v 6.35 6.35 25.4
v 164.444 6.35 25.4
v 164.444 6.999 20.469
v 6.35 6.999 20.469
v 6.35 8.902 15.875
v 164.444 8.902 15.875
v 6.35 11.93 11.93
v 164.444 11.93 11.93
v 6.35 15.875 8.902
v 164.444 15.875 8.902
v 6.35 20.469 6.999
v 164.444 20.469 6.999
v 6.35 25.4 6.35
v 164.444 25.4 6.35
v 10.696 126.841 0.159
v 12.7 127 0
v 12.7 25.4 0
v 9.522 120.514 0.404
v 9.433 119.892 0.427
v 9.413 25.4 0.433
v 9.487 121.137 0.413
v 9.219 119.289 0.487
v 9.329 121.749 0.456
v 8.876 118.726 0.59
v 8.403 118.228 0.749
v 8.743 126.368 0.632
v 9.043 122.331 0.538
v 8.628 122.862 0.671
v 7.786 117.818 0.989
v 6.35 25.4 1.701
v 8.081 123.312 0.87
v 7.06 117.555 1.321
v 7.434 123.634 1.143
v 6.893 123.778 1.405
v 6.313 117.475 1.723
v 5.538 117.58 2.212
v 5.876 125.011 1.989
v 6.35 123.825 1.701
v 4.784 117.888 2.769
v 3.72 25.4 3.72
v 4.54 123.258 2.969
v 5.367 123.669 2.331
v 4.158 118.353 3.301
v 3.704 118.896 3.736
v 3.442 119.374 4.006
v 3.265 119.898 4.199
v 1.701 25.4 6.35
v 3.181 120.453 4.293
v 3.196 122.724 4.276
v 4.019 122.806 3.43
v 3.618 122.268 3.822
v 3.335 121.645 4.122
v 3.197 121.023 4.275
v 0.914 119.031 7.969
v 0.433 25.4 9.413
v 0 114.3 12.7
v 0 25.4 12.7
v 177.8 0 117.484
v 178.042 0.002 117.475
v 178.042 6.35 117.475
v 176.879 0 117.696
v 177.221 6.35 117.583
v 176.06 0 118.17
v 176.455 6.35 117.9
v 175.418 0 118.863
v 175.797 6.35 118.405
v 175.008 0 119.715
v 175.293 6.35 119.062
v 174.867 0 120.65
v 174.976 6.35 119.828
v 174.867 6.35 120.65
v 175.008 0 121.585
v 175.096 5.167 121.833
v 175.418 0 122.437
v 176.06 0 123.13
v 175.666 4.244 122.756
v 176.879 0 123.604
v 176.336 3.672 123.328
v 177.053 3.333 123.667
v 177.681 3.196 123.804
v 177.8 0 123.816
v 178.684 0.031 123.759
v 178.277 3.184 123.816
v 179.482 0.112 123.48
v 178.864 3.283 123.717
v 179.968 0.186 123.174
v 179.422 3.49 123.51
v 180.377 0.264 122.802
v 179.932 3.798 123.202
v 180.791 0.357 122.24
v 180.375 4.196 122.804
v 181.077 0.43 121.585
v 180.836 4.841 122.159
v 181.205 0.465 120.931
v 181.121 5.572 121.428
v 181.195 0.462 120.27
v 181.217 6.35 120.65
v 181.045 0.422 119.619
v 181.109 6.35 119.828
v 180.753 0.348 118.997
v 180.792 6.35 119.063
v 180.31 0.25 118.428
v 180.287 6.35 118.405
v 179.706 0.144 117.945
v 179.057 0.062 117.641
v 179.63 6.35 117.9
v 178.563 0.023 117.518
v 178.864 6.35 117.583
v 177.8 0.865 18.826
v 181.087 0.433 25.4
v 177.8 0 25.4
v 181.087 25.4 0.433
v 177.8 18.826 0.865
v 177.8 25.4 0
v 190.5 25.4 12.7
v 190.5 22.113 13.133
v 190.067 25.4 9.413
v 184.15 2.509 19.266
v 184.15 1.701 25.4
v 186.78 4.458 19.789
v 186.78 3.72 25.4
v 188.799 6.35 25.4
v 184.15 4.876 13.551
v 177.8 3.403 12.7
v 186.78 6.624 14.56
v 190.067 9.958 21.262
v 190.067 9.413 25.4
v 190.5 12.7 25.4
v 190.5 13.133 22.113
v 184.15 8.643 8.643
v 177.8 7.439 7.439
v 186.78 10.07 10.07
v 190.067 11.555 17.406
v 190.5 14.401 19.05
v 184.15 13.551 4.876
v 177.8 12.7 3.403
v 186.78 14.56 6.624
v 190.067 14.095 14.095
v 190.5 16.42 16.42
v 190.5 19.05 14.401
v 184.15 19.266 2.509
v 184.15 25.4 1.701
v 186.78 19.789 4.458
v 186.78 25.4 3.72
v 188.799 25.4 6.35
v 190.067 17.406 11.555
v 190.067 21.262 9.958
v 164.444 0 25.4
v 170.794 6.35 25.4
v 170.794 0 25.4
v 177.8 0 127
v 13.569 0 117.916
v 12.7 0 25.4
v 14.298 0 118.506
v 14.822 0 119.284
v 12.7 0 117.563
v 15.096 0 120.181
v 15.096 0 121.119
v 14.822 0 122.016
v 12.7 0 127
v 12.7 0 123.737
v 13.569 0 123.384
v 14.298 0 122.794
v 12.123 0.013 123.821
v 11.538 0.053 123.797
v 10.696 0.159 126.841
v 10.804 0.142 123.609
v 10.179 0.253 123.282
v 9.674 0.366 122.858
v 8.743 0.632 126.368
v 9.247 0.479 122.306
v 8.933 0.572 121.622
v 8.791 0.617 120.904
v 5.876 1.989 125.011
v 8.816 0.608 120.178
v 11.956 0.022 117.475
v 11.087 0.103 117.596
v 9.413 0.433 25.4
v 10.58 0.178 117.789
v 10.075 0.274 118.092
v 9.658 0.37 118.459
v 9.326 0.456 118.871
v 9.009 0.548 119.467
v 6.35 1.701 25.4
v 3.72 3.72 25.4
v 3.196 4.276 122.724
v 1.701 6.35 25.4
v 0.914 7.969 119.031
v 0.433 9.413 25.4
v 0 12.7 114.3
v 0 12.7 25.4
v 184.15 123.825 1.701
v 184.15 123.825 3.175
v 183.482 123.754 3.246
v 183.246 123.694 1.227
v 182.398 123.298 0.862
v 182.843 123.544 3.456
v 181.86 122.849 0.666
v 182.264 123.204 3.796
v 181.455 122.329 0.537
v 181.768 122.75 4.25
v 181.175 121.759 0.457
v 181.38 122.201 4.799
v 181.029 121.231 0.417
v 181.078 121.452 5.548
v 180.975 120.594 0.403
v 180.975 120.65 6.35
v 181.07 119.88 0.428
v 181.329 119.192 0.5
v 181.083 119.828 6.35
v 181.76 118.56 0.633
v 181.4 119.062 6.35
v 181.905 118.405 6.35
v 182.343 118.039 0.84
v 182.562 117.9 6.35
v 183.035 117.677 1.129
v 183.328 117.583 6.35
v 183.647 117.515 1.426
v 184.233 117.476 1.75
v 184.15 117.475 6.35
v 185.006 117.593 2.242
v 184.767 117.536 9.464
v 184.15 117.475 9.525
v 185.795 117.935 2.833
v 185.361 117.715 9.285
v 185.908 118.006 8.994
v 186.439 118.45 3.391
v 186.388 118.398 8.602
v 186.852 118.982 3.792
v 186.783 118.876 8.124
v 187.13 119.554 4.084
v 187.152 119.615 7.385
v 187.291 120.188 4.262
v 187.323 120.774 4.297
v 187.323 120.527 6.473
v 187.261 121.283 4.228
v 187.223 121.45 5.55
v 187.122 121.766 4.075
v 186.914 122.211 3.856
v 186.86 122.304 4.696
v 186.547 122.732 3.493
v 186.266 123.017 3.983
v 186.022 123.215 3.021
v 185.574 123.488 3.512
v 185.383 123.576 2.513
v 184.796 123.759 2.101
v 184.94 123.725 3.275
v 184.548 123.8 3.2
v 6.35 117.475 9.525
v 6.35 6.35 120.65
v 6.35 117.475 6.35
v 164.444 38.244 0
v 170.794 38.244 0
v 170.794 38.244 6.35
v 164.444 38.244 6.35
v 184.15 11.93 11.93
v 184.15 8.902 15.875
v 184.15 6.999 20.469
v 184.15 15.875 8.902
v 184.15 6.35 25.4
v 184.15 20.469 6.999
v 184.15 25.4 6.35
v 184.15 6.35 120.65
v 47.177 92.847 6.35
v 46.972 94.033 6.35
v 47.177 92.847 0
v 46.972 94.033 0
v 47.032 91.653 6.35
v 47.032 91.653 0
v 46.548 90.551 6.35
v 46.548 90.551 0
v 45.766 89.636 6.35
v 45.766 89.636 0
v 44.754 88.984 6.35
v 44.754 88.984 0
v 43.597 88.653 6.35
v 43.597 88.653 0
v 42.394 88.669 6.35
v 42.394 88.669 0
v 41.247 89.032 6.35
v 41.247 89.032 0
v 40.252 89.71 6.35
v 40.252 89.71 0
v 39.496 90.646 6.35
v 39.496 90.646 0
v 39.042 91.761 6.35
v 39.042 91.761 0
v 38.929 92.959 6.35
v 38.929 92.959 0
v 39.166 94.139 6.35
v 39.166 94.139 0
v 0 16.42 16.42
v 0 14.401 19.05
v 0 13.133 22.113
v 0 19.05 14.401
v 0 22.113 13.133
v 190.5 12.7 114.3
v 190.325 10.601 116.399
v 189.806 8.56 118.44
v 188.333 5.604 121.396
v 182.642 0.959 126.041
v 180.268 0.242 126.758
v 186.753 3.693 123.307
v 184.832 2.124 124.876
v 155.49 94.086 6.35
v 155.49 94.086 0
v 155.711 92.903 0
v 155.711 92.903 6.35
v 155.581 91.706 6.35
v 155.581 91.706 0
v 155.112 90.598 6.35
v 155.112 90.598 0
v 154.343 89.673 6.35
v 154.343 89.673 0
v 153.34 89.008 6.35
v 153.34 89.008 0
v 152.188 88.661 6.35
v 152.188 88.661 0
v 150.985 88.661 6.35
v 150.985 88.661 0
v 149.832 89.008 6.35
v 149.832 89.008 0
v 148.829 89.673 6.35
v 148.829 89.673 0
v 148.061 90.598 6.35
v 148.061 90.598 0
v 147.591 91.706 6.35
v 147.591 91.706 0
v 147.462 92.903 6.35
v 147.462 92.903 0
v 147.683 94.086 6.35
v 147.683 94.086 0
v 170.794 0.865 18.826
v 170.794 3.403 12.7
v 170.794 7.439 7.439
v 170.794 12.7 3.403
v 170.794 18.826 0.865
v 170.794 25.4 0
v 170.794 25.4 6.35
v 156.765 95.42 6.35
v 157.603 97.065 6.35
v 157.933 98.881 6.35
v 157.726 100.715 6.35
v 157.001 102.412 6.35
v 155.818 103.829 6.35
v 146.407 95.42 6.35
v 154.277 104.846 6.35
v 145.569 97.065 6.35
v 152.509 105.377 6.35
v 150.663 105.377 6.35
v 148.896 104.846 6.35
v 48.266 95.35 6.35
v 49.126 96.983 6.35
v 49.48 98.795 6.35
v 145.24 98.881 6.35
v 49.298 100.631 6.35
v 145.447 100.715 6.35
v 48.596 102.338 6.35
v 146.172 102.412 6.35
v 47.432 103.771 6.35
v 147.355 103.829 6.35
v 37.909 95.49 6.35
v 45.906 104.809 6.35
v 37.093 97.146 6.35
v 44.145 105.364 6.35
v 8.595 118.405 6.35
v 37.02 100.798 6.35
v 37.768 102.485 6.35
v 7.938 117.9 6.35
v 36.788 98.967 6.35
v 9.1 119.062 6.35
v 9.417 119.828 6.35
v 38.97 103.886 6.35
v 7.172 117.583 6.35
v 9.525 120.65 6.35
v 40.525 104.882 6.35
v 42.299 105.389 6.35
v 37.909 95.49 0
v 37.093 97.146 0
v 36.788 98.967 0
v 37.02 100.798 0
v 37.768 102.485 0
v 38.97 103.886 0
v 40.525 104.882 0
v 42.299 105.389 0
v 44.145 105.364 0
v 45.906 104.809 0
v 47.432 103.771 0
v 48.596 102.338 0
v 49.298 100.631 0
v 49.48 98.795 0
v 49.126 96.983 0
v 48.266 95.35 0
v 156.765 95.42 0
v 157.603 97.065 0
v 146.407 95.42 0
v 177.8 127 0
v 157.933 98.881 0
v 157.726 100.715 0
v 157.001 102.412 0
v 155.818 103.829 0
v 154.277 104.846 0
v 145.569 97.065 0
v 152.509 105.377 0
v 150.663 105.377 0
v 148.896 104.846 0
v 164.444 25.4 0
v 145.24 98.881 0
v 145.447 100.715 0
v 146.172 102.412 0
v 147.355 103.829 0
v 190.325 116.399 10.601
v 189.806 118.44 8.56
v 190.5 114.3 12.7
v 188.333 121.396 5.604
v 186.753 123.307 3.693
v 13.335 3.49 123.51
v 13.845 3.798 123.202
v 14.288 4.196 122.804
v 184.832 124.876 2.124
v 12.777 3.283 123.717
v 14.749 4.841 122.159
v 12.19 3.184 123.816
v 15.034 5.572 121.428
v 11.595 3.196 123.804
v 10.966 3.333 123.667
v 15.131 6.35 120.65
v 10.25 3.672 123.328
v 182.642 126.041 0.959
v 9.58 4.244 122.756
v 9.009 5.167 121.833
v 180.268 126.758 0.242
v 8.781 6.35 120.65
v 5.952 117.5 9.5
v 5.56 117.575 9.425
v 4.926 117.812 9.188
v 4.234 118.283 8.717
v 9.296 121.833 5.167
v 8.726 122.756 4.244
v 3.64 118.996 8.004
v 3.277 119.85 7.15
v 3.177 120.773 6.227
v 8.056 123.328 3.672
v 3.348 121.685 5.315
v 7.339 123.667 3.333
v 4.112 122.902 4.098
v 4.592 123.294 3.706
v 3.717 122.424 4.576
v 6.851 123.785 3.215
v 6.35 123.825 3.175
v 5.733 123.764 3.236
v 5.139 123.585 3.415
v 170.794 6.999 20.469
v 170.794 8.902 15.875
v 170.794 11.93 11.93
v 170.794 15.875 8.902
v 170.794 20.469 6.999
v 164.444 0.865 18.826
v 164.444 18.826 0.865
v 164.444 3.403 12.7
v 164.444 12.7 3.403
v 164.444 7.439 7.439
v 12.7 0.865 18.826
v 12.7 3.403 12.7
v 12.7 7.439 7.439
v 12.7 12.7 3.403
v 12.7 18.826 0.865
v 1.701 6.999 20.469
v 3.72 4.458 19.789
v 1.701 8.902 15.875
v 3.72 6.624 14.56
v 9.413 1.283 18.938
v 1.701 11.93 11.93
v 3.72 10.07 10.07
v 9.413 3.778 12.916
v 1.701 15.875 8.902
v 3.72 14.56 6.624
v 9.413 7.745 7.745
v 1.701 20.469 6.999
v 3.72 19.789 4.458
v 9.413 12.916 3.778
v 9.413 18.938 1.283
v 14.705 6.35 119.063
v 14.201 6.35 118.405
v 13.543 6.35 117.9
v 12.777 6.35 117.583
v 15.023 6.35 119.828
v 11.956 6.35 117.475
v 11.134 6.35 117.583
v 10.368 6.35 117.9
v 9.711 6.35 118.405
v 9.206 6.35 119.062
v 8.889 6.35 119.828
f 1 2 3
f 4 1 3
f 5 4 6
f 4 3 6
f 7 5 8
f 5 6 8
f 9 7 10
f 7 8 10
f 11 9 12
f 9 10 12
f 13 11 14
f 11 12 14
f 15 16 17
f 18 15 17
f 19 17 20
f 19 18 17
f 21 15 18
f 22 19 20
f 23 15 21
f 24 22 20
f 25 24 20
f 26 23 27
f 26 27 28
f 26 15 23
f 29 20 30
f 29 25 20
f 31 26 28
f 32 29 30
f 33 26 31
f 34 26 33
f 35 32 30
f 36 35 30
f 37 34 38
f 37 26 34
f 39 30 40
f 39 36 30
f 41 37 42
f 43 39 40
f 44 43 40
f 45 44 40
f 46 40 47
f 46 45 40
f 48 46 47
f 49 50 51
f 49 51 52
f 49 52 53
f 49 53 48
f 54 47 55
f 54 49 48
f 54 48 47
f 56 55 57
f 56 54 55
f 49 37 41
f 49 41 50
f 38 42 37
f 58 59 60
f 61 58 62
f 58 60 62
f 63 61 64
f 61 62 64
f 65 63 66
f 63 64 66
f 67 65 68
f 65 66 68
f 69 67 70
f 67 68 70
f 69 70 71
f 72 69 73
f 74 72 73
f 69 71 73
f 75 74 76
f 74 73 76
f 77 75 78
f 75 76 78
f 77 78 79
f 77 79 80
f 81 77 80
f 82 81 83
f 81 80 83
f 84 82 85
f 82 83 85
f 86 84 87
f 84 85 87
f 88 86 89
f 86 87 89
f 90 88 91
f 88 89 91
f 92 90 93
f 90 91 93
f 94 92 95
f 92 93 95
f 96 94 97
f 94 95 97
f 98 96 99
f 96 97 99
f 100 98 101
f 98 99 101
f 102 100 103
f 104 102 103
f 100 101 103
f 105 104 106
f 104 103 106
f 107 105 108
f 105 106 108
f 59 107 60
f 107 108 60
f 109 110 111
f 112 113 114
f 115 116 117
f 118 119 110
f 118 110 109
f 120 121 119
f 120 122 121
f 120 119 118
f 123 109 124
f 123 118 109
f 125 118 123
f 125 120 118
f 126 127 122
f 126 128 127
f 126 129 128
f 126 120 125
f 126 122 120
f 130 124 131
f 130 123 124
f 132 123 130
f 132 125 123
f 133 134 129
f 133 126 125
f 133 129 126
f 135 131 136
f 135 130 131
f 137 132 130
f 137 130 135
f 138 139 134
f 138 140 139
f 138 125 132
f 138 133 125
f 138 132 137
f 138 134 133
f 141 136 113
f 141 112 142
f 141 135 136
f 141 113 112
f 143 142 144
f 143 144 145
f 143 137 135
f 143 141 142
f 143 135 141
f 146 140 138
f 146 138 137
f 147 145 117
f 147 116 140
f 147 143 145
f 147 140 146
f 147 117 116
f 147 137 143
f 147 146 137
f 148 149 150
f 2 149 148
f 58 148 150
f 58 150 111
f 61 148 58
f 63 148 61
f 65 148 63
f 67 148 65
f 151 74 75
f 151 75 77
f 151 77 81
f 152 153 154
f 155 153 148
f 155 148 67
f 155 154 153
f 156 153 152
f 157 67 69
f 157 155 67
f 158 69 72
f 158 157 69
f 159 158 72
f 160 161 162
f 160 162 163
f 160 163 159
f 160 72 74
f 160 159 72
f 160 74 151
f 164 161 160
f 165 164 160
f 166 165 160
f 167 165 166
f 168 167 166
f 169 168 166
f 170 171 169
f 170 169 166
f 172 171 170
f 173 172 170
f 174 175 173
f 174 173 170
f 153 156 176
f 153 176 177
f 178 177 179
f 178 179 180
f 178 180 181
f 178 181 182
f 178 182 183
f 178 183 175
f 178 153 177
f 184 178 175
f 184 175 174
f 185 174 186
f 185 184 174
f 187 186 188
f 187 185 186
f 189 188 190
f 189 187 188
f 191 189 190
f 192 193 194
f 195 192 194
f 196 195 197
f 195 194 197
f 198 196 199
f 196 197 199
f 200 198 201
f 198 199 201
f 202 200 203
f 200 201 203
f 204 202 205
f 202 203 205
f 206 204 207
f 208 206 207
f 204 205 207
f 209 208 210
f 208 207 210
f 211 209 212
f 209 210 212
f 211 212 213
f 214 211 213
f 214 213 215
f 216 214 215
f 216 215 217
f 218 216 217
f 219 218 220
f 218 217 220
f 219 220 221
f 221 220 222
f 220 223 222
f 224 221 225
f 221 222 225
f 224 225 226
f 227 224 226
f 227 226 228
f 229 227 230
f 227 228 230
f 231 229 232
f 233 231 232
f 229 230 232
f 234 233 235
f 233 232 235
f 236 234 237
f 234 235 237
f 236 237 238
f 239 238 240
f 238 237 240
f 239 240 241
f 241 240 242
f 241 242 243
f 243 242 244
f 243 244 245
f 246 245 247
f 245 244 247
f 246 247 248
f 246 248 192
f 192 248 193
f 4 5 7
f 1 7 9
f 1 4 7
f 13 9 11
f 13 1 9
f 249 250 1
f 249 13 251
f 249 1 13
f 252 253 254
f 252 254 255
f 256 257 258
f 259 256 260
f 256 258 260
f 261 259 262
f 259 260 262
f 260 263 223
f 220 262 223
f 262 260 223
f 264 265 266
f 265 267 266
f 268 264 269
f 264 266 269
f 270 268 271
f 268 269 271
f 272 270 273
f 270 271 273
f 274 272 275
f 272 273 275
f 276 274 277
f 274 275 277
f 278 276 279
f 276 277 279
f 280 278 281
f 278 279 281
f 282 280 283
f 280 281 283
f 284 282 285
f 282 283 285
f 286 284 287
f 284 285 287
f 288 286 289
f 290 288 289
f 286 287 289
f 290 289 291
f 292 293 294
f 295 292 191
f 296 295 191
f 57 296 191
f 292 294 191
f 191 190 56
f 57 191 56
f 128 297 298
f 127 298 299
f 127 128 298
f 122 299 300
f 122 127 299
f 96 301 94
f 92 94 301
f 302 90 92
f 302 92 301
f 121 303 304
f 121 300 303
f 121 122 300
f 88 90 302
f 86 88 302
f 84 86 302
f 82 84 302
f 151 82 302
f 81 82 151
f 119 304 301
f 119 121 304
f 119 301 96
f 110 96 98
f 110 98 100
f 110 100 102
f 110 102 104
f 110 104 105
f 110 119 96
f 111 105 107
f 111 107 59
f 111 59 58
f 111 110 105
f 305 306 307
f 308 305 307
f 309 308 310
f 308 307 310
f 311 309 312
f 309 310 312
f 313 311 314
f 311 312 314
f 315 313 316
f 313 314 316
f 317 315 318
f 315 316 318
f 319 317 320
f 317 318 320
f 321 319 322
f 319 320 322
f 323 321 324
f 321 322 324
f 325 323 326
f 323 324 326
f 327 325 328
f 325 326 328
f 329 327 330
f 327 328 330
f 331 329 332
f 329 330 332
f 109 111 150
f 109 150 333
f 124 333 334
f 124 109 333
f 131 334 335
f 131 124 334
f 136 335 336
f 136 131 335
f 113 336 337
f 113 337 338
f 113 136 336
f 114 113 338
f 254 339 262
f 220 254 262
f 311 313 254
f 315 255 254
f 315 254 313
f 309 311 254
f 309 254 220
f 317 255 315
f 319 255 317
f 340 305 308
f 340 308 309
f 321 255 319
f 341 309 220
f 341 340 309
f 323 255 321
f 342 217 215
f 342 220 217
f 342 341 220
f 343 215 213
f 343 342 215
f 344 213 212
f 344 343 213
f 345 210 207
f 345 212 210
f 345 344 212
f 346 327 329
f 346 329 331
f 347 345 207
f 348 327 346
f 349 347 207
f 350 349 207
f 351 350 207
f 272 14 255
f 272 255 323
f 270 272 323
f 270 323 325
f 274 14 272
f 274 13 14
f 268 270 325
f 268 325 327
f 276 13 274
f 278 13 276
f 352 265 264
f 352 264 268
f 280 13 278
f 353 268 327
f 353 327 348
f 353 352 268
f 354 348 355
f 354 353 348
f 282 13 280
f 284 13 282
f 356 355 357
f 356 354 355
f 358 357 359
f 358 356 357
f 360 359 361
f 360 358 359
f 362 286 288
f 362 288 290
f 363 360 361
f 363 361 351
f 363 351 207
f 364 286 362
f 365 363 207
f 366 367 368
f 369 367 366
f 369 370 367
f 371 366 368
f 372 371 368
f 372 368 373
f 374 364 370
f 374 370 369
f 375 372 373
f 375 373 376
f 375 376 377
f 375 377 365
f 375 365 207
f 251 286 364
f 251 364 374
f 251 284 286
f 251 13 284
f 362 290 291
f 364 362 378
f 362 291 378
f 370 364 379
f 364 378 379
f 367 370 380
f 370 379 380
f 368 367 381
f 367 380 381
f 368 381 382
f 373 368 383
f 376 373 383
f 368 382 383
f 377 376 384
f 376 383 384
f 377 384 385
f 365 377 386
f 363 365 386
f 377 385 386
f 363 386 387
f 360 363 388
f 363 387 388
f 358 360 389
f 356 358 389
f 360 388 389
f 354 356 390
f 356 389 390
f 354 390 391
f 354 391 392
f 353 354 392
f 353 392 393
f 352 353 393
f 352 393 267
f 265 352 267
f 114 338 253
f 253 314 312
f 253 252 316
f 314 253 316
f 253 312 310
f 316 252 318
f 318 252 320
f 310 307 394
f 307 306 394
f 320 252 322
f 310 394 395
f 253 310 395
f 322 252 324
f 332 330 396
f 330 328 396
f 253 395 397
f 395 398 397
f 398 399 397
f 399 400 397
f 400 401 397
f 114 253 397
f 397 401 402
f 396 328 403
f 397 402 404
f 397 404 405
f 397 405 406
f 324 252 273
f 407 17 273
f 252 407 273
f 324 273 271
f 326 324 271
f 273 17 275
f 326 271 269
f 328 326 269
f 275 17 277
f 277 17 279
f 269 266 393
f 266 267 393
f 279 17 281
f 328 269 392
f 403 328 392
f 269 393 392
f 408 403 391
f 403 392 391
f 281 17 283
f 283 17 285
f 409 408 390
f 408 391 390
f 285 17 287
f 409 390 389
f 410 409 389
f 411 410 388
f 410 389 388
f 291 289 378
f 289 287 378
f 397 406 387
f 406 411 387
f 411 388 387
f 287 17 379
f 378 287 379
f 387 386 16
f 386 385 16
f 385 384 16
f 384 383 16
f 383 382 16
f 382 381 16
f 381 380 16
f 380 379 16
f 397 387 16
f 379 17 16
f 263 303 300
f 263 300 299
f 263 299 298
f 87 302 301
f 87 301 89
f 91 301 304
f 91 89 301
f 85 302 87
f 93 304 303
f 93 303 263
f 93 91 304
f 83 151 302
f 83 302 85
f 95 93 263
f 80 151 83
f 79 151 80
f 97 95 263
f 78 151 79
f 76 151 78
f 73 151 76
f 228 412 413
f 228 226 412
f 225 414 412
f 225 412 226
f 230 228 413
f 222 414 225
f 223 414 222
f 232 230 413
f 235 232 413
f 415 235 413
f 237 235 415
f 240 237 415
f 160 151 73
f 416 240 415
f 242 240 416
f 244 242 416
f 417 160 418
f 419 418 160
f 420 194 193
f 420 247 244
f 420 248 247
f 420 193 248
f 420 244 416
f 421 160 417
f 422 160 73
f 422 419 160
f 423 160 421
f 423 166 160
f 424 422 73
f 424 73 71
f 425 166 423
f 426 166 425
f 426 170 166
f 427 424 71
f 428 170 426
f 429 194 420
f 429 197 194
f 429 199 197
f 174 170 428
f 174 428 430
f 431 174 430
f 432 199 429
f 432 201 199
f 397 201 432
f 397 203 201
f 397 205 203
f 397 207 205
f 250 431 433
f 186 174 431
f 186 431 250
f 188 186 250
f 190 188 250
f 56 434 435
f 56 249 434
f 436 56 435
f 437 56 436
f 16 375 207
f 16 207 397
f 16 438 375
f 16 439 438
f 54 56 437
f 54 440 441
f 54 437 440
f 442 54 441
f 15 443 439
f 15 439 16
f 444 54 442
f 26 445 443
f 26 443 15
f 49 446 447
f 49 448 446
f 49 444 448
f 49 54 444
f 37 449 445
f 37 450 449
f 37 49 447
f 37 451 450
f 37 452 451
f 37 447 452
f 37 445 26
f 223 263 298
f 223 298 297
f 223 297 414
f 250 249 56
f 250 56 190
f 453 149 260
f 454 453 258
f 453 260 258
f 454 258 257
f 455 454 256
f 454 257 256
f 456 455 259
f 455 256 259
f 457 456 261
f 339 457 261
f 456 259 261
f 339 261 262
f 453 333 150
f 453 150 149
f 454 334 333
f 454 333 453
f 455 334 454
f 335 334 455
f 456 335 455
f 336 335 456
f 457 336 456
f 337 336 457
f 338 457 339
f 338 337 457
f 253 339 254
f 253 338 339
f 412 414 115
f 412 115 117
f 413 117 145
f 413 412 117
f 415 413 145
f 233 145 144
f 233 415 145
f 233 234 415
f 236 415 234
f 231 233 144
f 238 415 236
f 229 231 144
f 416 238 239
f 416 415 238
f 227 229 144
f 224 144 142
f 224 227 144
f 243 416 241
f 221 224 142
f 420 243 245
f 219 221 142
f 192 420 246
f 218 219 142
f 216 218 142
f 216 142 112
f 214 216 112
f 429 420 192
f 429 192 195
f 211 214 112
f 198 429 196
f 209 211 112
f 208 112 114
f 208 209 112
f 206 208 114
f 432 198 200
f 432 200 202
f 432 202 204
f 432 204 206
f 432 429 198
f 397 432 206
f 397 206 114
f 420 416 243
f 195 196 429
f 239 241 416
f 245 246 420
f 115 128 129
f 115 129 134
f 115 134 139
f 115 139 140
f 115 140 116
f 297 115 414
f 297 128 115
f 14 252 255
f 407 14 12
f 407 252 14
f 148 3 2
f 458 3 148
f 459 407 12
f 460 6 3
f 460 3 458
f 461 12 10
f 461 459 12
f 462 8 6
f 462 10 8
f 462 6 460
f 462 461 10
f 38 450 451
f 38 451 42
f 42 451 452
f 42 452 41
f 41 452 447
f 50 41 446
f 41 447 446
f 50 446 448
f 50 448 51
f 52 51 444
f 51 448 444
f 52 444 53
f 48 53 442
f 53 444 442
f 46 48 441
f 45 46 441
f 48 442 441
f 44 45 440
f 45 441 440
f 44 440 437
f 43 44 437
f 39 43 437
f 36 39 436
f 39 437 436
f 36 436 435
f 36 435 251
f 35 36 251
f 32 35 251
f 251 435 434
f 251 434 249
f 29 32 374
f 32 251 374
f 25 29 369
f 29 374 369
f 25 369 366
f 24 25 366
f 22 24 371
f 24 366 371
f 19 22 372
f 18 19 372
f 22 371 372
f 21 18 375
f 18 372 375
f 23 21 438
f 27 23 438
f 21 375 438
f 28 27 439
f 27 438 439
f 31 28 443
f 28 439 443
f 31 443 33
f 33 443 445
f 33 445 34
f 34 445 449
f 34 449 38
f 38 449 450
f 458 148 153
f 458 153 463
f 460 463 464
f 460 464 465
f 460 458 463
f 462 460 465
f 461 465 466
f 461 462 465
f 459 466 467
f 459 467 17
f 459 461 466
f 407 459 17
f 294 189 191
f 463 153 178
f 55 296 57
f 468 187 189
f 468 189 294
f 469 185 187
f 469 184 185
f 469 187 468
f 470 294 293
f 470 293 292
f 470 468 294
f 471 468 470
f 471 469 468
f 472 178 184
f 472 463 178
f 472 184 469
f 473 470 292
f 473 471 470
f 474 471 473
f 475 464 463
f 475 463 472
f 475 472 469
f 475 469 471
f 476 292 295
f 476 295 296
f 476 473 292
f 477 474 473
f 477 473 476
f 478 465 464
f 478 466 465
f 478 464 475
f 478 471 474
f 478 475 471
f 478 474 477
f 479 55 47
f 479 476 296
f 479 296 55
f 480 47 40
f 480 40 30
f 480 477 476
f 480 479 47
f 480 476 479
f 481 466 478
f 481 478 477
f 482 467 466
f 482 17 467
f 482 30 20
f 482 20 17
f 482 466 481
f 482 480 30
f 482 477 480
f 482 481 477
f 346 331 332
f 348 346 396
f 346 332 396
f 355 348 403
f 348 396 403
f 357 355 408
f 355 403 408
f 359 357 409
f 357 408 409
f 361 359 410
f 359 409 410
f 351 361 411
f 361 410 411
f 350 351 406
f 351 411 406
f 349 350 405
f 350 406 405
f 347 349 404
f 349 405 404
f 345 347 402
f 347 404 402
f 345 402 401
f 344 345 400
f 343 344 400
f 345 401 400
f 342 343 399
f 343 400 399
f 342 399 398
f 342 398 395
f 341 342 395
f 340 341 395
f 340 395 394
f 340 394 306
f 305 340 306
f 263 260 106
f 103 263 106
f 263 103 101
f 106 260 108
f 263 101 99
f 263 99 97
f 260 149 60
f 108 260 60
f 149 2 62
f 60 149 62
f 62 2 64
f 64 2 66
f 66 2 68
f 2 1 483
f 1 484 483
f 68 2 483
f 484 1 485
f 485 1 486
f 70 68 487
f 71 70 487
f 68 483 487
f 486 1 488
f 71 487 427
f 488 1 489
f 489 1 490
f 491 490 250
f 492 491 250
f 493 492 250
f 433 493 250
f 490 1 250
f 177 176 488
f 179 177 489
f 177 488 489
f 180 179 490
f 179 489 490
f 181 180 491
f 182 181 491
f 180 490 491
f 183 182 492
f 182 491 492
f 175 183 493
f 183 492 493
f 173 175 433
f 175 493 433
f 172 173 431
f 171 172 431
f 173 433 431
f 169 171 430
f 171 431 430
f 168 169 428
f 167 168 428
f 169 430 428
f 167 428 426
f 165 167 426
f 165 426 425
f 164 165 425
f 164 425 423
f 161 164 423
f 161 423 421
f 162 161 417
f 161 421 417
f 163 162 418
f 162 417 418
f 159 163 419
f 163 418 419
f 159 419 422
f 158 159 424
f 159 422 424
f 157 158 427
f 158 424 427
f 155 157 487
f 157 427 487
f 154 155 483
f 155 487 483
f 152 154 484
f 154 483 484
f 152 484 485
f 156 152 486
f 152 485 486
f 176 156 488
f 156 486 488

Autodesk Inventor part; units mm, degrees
ref_plane "YZ Plane" through (0, 0, 0) normal (1, 0, 0) x (0, 1, 0)
ref_plane "XZ Plane" through (0, 0, 0) normal (0, 1, 0) x (-1, 0, 0)
ref_plane "XY Plane" through (0, 0, 0) normal (0, 0, 1) x (1, 0, 0)
sketch "Sketch1" plane through (0, 0, 0) normal (1, 0, 0) x (0, 1, 0)
  line L0 (0, 0) -> (127, 0)
  line L1 (0, 0) -> (0, 127)
  line L2 (0, 127) -> (127, 0)
  dimension "d0" = 127
  dimension "d1" = 127
extrude "Extrusion1" add sketch "Sketch1" along normal blind 190.5
fillet "Fillet1" radius 25.4 1 edges at (95.25, 0, 0)
shell "Shell1" thickness 6.35 removed faces 1 at (127, 84.6667, 42.3333)
fillet "Fillet2" radius 12.7 6 edges at (190.5, 7.4395, 7.4395) (190.5, 0, 76.2) (190.5, 76.2, 0) (0, 7.4395, 7.4395) (0, 0, 76.2) (0, 76.2, 0)
sketch "Sketch2" plane through (177.8, 127, 0) normal (0, 0, -1) x (-1, 0, 0)
  line L0 (7.0063, -88.7561) -> (13.3563, -88.7561)
  line L1 (13.3563, -88.7561) -> (13.3563, -152.2561)
  line L2 (13.3563, -152.2561) -> (7.0063, -152.2561)
  line L3 (7.0063, -152.2561) -> (7.0063, -88.7561)
  point P0 (177.8, -127)
  dimension "d7" = 6.35
  dimension "d8" = 63.5
extrude "Extrusion2" cut sketch "Sketch2" against normal blind 25.4
sketch "Sketch3" plane through (177.8, 127, 0) normal (0, 0, -1) x (-1, 0, 0)
  circle A0 centre (26.2137, -27.9058) radius 6.35
  circle A1 centre (134.6629, -27.9058) radius 6.35
  point P0 (177.8, -127)
  dimension "d11" = 12.7
  dimension "d12" = 12.7
extrude "Extrusion3" cut sketch "Sketch3" against normal blind 25.4
sketch "Sketch4" plane through (177.8, 127, 0) normal (0, 0, -1) x (-1, 0, 0)
  circle A0 centre (26.2137, -27.9058) radius 6.35 projected
  circle A1 centre (26.2137, -34.2558) radius 4.1275
  circle A2 centre (134.749, -34.2558) radius 4.1275
  point P0 (177.8, -127)
  dimension "d15" = 8.255
  dimension "d16" = 8.255
extrude "Extrusion4" cut sketch "Sketch4" against normal blind 25.4 contours A1 A0 | A0 A1 | A2 picked at (25.4127, -32.8707) picked at (27.1236, -35.5058)
sketch "Sketch5" plane through (177.8, 127, 0) normal (0, 0, -1) x (-1, 0, 0)
  point P0 (177.8, -127)
  point P1 (-6.35, -6.35)
  point P2 (171.45, -6.35)
  point P3 (171.45, -6.35)
hole "Hole1" at (184.15, 120.65, 0) at (6.35, 120.65, 0) direction (0, 0, 1) diameter 6.35 end through all
sketch "Sketch6" plane through (12.7, 0, 127) normal (0, -1, 0) x (1, 0, 0)
  line L0 (171.45, -6.35) -> (-6.35, -6.35) projected
  point P0 (-12.7, -127)
  point P1 (-0.7443, -6.35)
  point P2 (165.3424, -6.35)
hole "Hole2" at (11.9557, 0, 120.65) at (178.0424, 0, 120.65) direction (0, 1, 0) diameter 6.35 end through all
properties part number "shell"
